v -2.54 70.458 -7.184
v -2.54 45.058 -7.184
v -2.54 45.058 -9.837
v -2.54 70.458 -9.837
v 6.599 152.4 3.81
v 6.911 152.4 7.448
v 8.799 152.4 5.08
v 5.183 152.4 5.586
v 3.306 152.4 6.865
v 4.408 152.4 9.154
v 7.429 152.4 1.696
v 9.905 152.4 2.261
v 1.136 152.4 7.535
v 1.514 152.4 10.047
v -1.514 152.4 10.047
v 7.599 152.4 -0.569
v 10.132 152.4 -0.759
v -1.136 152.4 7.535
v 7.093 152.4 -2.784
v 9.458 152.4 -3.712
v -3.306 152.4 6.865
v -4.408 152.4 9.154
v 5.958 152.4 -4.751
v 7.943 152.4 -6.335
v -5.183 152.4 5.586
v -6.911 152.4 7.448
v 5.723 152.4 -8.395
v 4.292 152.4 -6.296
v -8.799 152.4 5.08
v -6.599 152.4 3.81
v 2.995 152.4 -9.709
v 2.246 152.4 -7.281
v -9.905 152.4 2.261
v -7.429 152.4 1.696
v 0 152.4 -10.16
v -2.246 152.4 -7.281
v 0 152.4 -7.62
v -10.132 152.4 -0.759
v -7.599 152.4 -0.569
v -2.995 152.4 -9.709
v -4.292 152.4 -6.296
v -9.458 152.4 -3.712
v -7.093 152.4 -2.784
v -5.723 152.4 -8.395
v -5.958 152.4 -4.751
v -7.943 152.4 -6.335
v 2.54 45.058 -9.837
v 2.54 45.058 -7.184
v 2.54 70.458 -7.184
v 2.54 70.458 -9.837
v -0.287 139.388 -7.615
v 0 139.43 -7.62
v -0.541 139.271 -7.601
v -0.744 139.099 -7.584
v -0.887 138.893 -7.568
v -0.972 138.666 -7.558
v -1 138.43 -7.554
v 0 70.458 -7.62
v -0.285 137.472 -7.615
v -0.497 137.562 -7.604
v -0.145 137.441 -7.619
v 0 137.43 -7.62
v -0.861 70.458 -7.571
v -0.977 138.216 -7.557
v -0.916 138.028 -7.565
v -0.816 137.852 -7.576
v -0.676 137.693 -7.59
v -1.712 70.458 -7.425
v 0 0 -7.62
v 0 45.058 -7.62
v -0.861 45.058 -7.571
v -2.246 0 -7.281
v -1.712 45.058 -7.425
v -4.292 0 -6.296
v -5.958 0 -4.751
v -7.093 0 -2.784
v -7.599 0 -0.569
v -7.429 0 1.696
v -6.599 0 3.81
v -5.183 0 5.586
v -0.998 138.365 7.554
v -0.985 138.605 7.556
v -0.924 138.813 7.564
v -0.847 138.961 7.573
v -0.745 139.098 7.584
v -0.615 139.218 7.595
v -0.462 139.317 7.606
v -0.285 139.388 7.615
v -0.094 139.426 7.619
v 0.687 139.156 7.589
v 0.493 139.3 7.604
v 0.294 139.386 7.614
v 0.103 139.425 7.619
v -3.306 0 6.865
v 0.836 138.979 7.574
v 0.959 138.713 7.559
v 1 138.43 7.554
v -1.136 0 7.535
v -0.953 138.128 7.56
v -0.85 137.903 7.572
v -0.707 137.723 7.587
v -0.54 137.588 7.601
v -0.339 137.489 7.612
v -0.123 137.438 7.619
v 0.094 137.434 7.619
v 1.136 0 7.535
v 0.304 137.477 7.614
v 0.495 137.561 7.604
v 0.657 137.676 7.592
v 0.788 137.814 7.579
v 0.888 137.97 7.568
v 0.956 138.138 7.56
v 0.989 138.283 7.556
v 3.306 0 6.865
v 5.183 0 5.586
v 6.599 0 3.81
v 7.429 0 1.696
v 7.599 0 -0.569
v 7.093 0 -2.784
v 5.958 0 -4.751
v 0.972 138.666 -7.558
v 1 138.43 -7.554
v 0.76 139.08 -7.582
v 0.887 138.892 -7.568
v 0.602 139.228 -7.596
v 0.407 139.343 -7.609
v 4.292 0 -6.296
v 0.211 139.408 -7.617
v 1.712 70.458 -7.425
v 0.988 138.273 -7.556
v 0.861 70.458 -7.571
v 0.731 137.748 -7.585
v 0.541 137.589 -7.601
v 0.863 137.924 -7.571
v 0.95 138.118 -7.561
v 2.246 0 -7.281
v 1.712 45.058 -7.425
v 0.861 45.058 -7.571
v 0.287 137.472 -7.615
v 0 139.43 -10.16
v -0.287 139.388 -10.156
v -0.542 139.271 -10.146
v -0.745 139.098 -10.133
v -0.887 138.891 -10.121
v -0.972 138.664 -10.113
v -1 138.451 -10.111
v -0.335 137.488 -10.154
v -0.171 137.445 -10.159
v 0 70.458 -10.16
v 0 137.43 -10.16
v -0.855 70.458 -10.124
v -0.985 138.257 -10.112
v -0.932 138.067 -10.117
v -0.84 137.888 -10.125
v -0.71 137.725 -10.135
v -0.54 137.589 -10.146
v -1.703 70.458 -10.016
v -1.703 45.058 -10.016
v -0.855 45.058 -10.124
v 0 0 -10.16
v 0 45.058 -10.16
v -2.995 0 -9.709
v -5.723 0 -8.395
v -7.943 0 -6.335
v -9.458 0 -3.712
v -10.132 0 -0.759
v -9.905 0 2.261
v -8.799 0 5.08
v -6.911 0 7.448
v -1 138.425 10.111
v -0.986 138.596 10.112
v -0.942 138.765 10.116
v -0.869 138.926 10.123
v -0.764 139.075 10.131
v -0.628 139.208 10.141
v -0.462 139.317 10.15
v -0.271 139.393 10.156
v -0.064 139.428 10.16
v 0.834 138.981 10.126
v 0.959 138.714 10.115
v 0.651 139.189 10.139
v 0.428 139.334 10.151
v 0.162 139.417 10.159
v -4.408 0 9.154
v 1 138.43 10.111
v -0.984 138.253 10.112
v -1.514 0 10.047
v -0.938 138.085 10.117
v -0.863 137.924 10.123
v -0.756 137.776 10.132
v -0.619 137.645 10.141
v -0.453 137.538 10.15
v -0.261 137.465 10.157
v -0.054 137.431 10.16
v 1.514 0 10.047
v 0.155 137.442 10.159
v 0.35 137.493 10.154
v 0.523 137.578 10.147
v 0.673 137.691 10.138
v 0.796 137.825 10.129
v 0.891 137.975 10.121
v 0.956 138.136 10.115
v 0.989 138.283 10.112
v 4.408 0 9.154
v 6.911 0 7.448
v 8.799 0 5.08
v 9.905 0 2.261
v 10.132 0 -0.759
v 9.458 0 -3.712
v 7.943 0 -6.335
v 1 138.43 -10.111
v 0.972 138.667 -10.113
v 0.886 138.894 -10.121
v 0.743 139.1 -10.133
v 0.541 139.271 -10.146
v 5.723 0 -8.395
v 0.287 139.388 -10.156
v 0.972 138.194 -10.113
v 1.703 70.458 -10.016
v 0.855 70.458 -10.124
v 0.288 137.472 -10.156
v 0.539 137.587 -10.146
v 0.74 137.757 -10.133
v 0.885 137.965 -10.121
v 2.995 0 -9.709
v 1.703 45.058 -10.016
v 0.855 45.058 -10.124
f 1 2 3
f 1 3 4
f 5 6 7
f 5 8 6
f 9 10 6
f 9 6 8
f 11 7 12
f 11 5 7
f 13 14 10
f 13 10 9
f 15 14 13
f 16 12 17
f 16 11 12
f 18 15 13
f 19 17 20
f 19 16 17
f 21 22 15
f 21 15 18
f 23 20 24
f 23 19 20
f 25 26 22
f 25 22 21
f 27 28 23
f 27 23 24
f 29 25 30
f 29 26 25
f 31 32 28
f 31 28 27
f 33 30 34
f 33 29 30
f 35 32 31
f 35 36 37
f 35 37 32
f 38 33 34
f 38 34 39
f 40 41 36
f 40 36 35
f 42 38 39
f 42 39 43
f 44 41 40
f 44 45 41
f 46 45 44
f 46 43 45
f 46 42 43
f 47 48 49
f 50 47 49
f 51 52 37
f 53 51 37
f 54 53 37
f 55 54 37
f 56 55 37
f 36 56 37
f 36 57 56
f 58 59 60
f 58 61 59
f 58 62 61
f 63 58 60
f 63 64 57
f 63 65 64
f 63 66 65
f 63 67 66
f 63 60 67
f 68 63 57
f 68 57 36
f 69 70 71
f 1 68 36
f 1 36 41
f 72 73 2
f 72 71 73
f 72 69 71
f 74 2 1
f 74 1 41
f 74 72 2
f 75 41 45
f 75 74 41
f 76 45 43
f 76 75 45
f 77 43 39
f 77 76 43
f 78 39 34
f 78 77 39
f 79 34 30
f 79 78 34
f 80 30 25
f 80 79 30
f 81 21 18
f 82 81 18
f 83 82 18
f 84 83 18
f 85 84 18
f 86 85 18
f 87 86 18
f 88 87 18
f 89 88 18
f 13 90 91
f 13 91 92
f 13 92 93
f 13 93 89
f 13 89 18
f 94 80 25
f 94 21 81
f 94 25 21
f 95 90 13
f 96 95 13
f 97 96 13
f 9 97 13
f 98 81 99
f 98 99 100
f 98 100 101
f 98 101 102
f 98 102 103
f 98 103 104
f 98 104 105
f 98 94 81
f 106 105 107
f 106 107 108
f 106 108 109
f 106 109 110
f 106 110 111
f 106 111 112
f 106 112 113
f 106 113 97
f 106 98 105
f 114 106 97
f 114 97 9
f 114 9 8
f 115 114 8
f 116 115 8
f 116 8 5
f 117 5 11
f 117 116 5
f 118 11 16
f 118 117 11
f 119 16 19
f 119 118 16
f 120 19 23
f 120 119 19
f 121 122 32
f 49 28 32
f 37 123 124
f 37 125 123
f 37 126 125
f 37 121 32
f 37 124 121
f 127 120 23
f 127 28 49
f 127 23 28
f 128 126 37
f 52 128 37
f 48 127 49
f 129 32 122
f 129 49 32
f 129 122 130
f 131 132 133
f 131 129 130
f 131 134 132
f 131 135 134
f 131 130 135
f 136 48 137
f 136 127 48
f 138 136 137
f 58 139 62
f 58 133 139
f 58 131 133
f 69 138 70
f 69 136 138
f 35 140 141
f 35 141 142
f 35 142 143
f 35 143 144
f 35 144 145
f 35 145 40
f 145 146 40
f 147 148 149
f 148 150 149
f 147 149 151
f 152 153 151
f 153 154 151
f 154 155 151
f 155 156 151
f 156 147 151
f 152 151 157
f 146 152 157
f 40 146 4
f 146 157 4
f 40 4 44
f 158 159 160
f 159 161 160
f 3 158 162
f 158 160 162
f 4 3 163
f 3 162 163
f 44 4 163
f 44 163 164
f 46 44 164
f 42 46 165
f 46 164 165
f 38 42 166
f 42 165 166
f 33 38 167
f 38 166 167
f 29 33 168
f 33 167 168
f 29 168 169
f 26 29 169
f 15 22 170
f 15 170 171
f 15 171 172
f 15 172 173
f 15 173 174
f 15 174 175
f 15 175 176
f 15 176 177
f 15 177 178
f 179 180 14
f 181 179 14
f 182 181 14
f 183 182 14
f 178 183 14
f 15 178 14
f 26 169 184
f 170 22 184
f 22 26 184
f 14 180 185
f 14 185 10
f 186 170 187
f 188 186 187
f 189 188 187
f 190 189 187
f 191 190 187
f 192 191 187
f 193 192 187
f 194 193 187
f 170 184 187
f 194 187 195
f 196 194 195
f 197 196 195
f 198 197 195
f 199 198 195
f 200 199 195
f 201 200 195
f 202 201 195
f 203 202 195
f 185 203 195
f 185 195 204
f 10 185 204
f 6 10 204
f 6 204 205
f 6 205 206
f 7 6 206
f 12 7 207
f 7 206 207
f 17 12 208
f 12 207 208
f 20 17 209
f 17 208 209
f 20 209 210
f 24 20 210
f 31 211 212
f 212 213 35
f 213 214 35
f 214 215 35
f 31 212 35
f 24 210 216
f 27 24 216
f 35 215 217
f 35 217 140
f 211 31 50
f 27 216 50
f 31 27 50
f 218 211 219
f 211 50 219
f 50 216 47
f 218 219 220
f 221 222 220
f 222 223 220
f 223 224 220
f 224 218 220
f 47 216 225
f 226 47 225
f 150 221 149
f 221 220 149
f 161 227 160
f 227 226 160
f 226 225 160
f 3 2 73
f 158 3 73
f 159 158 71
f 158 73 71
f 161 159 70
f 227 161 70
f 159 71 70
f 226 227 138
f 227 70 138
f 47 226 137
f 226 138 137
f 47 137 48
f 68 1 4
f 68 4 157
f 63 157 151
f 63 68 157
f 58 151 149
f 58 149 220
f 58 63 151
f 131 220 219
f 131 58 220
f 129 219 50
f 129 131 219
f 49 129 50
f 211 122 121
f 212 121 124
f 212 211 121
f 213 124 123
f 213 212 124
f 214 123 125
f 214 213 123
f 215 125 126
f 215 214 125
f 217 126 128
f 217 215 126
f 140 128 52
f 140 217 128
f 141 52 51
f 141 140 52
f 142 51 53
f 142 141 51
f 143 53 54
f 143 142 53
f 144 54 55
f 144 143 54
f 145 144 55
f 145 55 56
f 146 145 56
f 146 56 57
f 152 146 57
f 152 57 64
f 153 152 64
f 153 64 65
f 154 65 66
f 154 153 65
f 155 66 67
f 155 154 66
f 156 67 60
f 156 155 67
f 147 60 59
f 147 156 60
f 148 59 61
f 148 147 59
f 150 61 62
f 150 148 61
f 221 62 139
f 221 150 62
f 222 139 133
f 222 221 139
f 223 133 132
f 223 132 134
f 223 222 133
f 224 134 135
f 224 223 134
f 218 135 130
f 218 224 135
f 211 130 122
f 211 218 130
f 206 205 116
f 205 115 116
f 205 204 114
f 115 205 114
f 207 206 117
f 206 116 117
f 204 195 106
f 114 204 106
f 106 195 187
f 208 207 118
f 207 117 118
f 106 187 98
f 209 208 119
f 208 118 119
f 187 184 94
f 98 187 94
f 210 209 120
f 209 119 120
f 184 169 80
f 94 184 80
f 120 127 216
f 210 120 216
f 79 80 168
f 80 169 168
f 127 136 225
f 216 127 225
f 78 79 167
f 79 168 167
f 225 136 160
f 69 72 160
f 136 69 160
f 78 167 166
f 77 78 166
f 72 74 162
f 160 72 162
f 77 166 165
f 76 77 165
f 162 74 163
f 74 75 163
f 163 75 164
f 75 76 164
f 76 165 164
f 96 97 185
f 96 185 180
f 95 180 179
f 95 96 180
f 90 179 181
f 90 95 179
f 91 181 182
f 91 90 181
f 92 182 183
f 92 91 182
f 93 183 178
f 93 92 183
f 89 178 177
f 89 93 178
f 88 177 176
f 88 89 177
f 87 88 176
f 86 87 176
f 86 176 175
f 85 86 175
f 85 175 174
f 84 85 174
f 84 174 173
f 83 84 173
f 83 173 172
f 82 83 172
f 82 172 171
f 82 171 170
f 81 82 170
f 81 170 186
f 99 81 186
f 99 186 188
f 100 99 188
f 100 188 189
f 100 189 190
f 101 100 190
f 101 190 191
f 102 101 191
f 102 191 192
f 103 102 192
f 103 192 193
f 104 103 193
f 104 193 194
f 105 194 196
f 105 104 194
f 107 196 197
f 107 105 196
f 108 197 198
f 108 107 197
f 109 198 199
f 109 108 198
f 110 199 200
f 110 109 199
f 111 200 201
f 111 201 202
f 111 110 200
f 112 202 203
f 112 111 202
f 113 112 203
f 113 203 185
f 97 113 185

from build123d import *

# Parameters (mm, degrees)
SKETCH2_R               = 10.16
SKETCH2_R_2             = 7.62
BOSS_EXTRUDE1_DEPTH     = 152.4
CUT_EXTRUDE1_DEPTH      = 154.075834801
CUT_EXTRUDE1_DEPTH_BACK = 154.075834801
SKETCH3_R               = 1
SKETCH4_W               = 5.08
SKETCH4_H               = 25.4
CUT_EXTRUDE2_DEPTH      = 154.075834914


with BuildPart() as part:
    # Sketch2 → Boss-Extrude1 (new body)
    with BuildSketch(Plane(origin=(0, 0, 0), x_dir=(1, 0, 0), z_dir=(0, 1, 0))):
        with Locations(Location((0, 0, 0), (0, 0, 90))):
            Circle(SKETCH2_R)
        with Locations(Location((0, 0, 0), (0, 0, 90))):
            Circle(SKETCH2_R_2, mode=Mode.SUBTRACT)
    extrude(amount=BOSS_EXTRUDE1_DEPTH)

    # Sketch3 → Cut-Extrude1 (cut, two sides: drawn at the far end of the back side and taken through both)
    with BuildSketch(Plane.XY.offset(-CUT_EXTRUDE1_DEPTH_BACK)):
        with Locations((0, 138.43)):
            Circle(SKETCH3_R)
    extrude(amount=CUT_EXTRUDE1_DEPTH + CUT_EXTRUDE1_DEPTH_BACK, mode=Mode.SUBTRACT)

    # Sketch4 → Cut-Extrude2 (cut, through all)
    with BuildSketch(Plane.XY):
        with Locations((0, 57.757755026)):
            Rectangle(SKETCH4_W, SKETCH4_H)
    extrude(amount=-CUT_EXTRUDE2_DEPTH, mode=Mode.SUBTRACT)


solid = part.part
